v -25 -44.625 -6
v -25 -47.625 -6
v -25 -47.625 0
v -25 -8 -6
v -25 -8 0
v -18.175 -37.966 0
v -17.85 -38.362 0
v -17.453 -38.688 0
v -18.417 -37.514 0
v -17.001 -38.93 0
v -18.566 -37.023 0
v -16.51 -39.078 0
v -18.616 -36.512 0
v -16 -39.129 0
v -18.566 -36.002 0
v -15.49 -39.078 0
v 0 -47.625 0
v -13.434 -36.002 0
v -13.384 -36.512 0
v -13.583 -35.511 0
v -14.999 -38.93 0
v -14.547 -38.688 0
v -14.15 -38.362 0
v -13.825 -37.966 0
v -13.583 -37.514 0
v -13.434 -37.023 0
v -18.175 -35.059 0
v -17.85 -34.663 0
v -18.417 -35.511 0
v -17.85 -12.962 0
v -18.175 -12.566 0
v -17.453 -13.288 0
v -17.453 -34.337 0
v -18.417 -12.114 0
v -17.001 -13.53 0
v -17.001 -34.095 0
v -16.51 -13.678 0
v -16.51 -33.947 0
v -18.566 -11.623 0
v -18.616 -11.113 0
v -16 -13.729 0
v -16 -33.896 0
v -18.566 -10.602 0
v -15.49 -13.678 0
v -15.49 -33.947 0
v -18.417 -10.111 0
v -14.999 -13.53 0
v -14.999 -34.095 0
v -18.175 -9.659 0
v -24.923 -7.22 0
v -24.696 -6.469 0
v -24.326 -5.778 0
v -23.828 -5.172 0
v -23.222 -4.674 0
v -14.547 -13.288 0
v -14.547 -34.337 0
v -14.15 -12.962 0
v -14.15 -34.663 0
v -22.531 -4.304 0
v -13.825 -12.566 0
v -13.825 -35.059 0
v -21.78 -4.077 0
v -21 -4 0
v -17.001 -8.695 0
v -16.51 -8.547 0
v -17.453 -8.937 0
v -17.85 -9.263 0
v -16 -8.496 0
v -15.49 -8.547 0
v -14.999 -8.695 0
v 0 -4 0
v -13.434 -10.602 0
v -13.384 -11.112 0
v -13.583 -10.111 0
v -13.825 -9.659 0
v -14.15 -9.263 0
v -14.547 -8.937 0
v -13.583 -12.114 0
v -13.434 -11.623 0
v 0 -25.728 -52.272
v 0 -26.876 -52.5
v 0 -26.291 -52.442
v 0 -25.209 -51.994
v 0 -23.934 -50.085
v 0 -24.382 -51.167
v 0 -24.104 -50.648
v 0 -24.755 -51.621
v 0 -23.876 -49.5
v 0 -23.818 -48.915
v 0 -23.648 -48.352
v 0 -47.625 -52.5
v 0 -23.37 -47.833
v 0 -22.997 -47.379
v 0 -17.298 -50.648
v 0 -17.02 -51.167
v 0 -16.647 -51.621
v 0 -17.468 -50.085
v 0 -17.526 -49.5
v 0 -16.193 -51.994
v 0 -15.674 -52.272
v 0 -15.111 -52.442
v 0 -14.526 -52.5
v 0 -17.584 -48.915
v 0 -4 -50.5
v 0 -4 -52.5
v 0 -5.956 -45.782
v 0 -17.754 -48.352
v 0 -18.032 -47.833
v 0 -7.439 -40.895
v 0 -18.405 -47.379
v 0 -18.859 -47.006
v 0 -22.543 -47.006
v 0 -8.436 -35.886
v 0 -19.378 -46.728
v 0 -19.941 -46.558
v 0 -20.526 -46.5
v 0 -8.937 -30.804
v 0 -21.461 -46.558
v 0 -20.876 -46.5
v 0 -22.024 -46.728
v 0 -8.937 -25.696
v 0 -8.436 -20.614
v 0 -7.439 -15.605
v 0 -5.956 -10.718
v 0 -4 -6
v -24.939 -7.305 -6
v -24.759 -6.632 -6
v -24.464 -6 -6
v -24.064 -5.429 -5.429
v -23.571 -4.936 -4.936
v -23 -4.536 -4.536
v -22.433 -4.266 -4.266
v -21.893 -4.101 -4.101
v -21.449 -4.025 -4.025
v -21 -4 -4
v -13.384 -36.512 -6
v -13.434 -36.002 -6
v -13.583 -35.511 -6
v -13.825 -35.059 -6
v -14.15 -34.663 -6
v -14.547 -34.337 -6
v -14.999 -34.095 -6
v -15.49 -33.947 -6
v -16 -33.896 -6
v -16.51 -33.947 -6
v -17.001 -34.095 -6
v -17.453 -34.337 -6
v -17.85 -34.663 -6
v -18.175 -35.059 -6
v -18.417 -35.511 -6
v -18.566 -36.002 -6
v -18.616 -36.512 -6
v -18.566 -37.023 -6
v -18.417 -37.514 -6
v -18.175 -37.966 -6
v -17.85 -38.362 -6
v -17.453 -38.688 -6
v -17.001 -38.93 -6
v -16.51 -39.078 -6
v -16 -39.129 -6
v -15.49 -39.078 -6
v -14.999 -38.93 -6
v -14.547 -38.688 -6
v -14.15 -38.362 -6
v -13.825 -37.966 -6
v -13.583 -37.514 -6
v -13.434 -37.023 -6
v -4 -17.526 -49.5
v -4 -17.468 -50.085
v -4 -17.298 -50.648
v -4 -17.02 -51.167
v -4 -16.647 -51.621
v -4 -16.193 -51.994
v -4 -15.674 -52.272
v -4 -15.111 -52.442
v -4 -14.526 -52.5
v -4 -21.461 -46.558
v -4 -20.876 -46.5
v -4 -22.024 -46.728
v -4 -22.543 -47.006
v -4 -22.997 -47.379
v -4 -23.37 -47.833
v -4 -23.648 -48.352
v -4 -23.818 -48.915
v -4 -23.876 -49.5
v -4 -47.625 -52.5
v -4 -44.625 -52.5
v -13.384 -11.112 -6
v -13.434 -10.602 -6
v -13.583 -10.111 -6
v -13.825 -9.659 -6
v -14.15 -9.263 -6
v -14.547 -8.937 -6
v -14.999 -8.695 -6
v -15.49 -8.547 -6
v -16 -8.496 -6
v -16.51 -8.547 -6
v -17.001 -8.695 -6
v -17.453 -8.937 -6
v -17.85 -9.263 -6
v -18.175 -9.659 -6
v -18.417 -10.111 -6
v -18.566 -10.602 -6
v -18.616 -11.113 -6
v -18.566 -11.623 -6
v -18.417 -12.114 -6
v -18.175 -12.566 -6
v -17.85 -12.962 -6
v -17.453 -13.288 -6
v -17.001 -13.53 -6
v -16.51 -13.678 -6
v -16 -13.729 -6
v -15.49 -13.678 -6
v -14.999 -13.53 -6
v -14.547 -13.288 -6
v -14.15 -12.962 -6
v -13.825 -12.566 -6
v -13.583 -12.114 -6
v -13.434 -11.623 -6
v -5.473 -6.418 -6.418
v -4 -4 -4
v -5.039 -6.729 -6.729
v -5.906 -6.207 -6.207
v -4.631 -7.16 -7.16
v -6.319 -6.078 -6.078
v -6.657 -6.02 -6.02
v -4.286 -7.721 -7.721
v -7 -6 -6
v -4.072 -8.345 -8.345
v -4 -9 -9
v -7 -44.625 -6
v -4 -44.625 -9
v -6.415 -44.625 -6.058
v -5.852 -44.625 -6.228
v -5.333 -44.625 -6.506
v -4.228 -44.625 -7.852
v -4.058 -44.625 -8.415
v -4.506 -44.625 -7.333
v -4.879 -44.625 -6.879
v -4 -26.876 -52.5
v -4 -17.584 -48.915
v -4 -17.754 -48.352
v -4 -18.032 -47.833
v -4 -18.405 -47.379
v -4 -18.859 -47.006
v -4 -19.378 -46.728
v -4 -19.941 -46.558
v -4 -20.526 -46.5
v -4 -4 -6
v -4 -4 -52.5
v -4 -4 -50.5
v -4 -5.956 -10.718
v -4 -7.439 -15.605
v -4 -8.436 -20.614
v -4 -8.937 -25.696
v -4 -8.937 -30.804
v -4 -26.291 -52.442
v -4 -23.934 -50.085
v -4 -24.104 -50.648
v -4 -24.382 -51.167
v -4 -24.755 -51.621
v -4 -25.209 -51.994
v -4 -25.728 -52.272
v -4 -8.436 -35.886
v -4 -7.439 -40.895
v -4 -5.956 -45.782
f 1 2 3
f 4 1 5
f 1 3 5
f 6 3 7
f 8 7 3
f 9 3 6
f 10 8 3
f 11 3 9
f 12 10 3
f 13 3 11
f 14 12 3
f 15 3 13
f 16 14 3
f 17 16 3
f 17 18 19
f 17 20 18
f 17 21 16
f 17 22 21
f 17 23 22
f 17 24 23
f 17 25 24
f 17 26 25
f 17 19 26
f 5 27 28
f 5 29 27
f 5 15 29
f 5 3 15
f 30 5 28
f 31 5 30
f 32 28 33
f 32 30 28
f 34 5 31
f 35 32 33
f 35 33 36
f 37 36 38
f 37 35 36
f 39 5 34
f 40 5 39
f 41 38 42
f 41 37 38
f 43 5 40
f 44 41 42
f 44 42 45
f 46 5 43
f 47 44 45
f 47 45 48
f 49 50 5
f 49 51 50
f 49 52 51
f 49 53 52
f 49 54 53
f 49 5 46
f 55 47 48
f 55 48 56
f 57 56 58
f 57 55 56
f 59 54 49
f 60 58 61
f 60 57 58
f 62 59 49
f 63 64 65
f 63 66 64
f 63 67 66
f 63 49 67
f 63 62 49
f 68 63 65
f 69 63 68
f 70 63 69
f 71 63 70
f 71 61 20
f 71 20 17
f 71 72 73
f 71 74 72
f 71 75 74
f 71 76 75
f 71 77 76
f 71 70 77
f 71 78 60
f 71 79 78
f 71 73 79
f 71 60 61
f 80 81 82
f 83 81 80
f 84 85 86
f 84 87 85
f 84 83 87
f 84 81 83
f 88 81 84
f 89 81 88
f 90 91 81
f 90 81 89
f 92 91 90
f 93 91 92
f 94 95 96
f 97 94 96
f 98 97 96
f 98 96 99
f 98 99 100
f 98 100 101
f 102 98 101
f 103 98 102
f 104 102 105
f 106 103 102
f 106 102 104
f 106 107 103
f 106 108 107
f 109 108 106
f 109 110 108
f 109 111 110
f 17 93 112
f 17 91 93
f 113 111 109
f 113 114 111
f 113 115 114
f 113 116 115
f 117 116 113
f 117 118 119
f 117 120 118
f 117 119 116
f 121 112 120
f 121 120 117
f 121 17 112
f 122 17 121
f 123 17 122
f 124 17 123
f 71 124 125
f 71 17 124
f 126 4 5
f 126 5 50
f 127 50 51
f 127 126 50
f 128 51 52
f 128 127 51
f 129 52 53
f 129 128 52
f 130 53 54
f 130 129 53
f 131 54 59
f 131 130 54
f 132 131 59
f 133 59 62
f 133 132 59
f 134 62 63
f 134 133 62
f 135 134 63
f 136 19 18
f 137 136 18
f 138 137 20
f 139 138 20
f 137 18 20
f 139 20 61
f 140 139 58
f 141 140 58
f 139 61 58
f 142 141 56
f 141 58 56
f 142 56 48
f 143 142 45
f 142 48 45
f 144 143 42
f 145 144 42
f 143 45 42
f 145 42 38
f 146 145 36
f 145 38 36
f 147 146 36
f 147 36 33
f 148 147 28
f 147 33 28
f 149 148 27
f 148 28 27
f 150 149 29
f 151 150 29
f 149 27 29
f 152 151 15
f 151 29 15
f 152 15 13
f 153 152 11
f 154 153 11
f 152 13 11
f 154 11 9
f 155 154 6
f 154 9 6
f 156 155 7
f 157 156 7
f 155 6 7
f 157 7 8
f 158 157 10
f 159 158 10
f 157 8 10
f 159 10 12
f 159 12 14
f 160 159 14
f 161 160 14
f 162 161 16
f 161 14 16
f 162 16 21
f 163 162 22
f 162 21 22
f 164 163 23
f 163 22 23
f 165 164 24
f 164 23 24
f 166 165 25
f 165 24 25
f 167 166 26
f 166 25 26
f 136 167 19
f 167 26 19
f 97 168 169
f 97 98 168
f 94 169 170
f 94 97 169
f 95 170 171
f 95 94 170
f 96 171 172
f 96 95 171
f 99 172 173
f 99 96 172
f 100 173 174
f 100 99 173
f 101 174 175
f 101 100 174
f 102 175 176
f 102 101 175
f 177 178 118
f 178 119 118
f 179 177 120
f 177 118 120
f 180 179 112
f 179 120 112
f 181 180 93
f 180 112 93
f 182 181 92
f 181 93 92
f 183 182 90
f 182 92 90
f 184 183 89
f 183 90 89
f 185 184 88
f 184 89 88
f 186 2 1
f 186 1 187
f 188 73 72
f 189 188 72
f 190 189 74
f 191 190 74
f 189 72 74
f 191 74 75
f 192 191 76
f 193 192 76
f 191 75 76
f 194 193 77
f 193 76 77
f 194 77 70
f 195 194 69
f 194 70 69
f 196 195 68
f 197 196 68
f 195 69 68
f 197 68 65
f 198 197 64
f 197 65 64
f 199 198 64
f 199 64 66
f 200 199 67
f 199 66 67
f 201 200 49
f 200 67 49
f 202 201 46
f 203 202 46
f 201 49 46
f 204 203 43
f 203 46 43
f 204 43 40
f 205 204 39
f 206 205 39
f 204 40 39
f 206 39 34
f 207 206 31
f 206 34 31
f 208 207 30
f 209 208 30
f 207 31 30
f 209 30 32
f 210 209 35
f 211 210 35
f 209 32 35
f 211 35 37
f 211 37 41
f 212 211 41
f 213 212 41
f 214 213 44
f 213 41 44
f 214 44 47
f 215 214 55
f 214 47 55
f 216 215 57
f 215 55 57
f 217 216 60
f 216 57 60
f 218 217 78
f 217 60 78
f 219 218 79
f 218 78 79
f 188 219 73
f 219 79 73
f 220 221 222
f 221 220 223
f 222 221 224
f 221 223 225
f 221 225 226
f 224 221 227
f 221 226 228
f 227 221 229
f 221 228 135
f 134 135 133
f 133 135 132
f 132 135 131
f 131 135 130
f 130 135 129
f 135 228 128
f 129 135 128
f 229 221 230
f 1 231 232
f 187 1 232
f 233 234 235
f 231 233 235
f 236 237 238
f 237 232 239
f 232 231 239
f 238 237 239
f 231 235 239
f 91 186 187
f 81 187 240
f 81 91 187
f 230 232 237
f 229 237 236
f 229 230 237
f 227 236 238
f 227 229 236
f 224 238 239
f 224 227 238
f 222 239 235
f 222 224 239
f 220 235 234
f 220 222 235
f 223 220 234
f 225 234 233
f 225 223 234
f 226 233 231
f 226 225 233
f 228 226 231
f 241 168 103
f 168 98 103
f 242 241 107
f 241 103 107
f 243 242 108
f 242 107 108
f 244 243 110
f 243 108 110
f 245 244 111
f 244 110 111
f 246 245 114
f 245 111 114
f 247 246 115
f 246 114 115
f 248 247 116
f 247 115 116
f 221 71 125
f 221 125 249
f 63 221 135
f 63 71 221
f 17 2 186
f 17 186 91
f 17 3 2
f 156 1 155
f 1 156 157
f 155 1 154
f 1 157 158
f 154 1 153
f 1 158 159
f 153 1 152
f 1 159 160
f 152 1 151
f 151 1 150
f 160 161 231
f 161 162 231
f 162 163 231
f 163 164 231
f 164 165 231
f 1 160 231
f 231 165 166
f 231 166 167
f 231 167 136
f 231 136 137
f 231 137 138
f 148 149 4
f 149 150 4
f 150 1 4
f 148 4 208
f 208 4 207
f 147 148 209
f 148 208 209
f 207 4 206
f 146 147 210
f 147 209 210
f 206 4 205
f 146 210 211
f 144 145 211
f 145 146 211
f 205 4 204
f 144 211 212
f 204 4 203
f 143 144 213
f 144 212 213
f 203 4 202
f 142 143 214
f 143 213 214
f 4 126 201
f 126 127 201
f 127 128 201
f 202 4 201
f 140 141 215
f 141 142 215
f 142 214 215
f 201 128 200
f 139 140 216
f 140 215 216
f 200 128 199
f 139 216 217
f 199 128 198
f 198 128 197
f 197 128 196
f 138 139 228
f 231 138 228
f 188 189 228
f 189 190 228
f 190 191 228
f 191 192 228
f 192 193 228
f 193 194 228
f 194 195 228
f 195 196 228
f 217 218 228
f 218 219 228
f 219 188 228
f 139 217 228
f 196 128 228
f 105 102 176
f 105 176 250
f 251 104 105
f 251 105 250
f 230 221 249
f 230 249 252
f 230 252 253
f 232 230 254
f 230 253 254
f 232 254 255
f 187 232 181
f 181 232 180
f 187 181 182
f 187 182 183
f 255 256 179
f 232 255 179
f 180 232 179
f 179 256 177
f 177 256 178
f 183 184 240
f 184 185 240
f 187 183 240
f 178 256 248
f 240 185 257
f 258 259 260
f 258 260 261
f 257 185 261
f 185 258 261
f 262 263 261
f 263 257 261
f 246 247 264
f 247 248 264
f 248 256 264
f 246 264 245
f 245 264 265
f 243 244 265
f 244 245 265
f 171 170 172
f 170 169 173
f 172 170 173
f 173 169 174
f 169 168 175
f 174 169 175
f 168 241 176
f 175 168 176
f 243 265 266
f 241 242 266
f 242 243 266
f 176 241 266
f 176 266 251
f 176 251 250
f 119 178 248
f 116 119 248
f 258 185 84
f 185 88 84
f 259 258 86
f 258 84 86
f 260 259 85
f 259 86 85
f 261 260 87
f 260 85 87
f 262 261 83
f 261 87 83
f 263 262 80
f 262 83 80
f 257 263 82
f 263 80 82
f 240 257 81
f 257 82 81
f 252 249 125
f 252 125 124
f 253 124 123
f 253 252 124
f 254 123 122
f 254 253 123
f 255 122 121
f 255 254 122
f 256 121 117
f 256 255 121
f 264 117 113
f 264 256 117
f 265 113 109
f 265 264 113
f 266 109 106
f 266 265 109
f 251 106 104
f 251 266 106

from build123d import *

# Parameters (mm, degrees)
SKETCH1_W               = 25
SKETCH1_H               = 47.625
SKETCH1_R               = 2.6162
BOSS_EXTRUDE1_DEPTH     = 6
SKETCH3_W               = 52.5
SKETCH3_H               = 47.625
BOSS_EXTRUDE2_DEPTH     = 4
BOSS_EXTRUDE3_DEPTH     = 3
CUT_EXTRUDE1_DEPTH      = 72.101270207
CUT_EXTRUDE1_DEPTH_BACK = 72.101270207
SKETCH5_W               = 25
SKETCH5_H               = 4
CHAMFER1_SIZE           = 2
SKETCH6_W               = 6
SKETCH6_H               = 6.35
CUT_EXTRUDE2_DEPTH      = 74.928280279
CUT_EXTRUDE3_DEPTH      = 74.928280279
FILLET2_R               = 3
FILLET1_R               = 3
FILLET3_R               = 4


with BuildPart() as part:
    # Sketch1 → Boss-Extrude1 (new body)
    with BuildSketch(Plane.XY):
        with Locations((-12.5, -23.8125)):
            Rectangle(SKETCH1_W, SKETCH1_H)
        with Locations((-16, -11.1125)):
            Circle(SKETCH1_R, mode=Mode.SUBTRACT)
        with Locations((-16, -36.5125)):
            Circle(SKETCH1_R, mode=Mode.SUBTRACT)
    extrude(amount=-BOSS_EXTRUDE1_DEPTH)

    # Sketch3 → Boss-Extrude2 (add)
    with BuildSketch(Plane(origin=(0, 0, 0), x_dir=(0, 0, -1), z_dir=(1, 0, 0))):
        with Locations((26.25, -23.8125)):
            Rectangle(SKETCH3_W, SKETCH3_H)
    extrude(amount=-BOSS_EXTRUDE2_DEPTH)

    # Sketch4 → Boss-Extrude3 (add)
    with BuildSketch(Plane.XZ.offset(47.625)):
        Polygon((-25, -6), (-4, -52.5), (-4, -6), align=None)
    extrude(amount=-BOSS_EXTRUDE3_DEPTH)

    # Sketch5 → Cut-Extrude1 (cut, two sides: drawn at the far end of the back side and taken through both)
    with BuildSketch(Plane(origin=(0, 0, -6), x_dir=(-1, 0, 0), z_dir=(0, 0, -1)).offset(-CUT_EXTRUDE1_DEPTH_BACK)):
        with Locations((12.5, -2)):
            Rectangle(SKETCH5_W, SKETCH5_H)
    extrude(amount=CUT_EXTRUDE1_DEPTH + CUT_EXTRUDE1_DEPTH_BACK, mode=Mode.SUBTRACT)

    # Chamfer1
    chamfer1_edges = [part.edges().sort_by_distance(p)[0] for p in [
        (-14.5, -4, -6),
    ]]
    chamfer(chamfer1_edges, length=CHAMFER1_SIZE)

    # Sketch6 → Cut-Extrude2 (cut, through all)
    with BuildSketch(Plane.ZY.offset(4)):
        with Locations((-49.5, -20.701)):
            Rectangle(SKETCH6_W, SKETCH6_H)
    extrude(amount=-CUT_EXTRUDE2_DEPTH, mode=Mode.SUBTRACT)

    # Sketch7 → Cut-Extrude3 (cut, through all)
    with BuildSketch(Plane.ZY.offset(4)):
        with BuildLine():
            Line((-50.5, -4), (-6, -4))
            ThreePointArc((-6, -4), (-28.25, -9), (-50.5, -4))
        make_face()
    extrude(amount=-CUT_EXTRUDE3_DEPTH, mode=Mode.SUBTRACT)

    # Fillet2
    fillet2_edges = [part.edges().sort_by_distance(p)[0] for p in [
        (-2, -17.526, -46.5),
        (-2, -23.876, -46.5),
    ]]
    fillet(fillet2_edges, radius=FILLET2_R)
    fillet2_2_edges = [part.edges().sort_by_distance(p)[0] for p in [
        (-2, -17.526, -52.5),
        (-2, -23.876, -52.5),
    ]]
    fillet(fillet2_2_edges, radius=FILLET2_R - 0.0001)  # a hair under: the kernel refuses the full size

    # Fillet1
    fillet1_edges = [part.edges().sort_by_distance(p)[0] for p in [
        (-4, -25.3125, -6),
    ]]
    fillet(fillet1_edges, radius=FILLET1_R)

    # Fillet3
    fillet3_edges = [part.edges().sort_by_distance(p)[0] for p in [
        (-25, -4, -2),
    ]]
    fillet(fillet3_edges, radius=FILLET3_R)


solid = part.part
